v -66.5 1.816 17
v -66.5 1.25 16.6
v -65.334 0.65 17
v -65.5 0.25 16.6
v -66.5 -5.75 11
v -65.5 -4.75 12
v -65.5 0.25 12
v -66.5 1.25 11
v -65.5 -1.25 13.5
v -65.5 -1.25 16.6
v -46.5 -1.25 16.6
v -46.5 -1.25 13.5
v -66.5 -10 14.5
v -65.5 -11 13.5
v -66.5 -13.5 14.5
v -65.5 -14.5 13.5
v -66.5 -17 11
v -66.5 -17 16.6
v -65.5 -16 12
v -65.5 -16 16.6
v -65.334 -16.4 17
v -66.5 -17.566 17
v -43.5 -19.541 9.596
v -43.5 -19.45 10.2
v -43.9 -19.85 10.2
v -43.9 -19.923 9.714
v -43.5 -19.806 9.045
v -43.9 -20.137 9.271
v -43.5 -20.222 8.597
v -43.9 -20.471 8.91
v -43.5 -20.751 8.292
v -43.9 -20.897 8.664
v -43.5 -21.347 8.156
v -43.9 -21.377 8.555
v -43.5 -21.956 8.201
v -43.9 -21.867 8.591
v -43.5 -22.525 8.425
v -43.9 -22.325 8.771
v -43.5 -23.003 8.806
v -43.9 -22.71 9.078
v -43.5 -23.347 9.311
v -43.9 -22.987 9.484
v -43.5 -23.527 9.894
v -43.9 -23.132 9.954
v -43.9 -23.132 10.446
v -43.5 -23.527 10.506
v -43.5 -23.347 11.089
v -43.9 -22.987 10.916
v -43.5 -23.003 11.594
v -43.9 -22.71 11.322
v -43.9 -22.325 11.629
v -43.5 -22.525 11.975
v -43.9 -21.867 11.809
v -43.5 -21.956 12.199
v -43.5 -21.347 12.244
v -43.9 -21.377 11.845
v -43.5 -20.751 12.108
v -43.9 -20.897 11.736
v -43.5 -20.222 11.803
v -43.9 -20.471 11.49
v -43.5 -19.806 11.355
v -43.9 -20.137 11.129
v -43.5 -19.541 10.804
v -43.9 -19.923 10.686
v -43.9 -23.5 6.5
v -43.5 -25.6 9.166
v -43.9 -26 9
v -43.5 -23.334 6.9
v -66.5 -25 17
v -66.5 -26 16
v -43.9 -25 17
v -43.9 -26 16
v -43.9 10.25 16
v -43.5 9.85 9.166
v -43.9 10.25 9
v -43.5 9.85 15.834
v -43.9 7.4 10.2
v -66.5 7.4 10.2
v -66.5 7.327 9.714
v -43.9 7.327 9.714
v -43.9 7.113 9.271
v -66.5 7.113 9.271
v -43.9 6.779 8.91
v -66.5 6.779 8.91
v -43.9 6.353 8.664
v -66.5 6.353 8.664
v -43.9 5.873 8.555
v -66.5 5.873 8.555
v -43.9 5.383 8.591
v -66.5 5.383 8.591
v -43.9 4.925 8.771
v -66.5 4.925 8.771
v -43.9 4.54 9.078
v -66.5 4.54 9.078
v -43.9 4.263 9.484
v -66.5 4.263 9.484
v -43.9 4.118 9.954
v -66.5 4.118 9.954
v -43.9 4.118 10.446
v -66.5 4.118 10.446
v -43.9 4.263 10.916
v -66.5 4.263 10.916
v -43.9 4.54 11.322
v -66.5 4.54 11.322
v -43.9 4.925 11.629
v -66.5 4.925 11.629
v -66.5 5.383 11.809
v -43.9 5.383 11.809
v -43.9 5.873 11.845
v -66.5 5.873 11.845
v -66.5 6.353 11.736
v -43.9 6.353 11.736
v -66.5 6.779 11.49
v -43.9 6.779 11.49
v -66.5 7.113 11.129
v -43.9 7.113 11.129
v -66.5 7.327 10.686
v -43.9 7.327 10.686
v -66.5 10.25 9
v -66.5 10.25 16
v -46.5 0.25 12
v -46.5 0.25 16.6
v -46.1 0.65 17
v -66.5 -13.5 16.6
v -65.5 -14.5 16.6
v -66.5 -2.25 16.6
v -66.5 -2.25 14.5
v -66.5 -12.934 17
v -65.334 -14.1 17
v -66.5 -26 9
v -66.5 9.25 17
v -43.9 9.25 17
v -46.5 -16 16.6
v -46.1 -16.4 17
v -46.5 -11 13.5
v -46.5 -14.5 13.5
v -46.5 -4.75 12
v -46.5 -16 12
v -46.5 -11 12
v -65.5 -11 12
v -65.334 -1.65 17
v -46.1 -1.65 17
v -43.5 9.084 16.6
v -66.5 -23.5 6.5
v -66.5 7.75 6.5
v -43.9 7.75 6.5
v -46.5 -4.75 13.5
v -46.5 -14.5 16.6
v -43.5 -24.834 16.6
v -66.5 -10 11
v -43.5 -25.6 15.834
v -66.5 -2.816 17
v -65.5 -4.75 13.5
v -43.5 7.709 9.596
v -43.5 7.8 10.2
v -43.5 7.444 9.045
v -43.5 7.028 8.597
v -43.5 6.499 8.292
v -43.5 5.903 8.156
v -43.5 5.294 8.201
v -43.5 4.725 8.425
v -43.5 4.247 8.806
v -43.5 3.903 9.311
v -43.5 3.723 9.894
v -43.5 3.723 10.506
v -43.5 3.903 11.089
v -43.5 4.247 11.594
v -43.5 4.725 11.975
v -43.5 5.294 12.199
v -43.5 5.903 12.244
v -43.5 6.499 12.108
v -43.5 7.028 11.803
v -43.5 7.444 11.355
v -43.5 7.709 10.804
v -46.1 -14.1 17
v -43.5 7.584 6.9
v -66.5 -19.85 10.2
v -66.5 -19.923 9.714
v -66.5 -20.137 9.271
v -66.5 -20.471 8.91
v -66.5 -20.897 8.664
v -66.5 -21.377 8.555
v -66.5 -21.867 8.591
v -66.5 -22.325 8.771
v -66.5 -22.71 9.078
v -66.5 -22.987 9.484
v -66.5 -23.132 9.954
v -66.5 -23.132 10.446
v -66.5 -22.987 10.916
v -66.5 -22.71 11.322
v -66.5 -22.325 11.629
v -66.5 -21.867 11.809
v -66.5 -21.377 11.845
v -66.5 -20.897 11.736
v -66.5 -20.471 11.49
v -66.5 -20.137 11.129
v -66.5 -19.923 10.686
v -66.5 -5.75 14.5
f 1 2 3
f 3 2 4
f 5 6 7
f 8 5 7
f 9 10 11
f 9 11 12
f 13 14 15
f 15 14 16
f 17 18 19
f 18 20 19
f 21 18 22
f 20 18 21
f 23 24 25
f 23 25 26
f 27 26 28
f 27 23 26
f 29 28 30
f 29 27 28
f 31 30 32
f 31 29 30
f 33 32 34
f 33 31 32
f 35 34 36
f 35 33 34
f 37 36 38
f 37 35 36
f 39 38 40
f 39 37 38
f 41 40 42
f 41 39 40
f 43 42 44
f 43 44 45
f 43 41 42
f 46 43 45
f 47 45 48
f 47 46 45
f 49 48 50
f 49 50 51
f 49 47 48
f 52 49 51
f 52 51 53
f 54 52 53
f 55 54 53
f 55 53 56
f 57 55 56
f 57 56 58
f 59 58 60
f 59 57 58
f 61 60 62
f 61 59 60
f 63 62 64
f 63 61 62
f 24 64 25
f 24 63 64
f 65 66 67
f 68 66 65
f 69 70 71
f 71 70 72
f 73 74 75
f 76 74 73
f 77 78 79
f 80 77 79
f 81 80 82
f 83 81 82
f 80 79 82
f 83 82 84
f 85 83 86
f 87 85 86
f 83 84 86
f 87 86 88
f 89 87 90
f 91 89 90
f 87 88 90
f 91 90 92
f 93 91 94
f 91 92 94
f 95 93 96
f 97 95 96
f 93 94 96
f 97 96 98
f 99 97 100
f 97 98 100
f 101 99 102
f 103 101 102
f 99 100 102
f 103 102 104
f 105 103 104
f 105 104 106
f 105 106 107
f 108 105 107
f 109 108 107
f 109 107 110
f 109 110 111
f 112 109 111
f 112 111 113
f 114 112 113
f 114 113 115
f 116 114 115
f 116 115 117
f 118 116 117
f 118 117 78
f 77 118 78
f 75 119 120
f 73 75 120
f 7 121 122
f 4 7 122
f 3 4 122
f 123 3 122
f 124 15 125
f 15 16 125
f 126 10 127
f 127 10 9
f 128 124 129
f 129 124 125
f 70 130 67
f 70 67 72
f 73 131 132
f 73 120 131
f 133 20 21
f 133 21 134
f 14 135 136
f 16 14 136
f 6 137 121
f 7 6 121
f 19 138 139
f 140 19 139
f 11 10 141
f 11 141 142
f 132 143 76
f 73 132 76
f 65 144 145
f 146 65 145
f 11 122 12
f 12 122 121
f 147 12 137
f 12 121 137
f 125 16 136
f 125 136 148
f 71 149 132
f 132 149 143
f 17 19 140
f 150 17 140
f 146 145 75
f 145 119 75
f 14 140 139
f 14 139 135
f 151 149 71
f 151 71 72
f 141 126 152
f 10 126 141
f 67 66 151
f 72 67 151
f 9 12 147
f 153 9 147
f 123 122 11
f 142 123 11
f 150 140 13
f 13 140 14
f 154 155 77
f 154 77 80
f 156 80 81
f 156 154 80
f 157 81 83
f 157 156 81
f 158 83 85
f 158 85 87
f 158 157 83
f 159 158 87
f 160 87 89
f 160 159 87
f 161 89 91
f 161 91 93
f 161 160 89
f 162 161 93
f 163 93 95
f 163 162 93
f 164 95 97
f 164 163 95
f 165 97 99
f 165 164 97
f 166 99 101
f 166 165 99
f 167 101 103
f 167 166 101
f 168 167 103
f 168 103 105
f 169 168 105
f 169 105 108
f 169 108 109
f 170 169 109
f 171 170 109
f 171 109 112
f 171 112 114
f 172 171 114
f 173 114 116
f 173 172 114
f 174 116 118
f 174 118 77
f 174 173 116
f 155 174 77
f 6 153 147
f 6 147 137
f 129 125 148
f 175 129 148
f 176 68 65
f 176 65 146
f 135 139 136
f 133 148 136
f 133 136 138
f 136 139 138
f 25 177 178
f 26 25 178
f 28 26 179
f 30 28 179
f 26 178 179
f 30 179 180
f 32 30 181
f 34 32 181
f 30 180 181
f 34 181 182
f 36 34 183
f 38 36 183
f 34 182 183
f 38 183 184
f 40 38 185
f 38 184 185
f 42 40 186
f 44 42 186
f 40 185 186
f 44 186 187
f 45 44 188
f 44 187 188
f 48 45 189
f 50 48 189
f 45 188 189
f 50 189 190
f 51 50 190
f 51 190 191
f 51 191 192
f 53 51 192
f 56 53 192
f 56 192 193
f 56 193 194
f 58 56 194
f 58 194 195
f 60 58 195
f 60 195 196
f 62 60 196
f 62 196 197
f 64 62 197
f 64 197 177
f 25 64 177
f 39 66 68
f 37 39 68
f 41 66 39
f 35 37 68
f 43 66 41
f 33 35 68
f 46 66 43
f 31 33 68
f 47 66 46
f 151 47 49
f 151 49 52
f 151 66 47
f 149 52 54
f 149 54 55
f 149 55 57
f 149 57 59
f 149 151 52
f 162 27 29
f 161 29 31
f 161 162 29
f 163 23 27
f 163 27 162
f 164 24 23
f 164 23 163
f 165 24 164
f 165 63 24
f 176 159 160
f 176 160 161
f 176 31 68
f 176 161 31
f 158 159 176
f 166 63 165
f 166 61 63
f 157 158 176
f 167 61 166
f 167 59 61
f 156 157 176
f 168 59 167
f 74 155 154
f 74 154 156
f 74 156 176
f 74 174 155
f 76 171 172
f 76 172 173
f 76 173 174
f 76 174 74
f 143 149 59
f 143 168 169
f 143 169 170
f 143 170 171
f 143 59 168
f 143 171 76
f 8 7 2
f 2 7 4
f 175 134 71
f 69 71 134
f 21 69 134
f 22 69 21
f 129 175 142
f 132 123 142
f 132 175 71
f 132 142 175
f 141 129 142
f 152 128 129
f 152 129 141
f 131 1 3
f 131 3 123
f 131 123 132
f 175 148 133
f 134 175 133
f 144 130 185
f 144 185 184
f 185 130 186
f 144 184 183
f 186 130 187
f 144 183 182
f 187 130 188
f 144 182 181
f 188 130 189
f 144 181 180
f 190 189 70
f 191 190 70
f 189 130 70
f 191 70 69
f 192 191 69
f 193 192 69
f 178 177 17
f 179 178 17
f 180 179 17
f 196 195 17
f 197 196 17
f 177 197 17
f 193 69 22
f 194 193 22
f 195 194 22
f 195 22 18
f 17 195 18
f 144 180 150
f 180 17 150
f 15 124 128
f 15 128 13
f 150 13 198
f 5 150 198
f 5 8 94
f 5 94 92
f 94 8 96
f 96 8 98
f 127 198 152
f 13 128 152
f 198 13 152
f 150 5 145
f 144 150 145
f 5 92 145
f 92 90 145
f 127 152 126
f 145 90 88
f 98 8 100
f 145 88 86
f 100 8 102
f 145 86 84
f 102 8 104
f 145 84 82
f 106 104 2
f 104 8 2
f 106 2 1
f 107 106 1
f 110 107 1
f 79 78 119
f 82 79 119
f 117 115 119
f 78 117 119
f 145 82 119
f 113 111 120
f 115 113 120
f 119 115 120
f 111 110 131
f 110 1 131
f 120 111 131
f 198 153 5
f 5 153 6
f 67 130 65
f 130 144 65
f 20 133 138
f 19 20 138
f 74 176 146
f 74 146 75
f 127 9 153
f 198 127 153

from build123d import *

# Parameters (mm, degrees)
SKETCH038_W     = 36.25
SKETCH038_H     = 10.5
PAD012_DEPTH    = 23
SKETCH039_R     = 1.65
POCKET026_DEPTH = 23.001
POCKET027_DEPTH = 20
CHAMFER014_SIZE = 1
CHAMFER015_SIZE = 1
CHAMFER016_SIZE = 2.5
CHAMFER017_SIZE = 0.4
CHAMFER018_SIZE = 0.4


with BuildPart() as part:
    # Sketch038 → Pad012 (new body)
    with BuildSketch(Plane.YZ):
        with Locations((18.125, 5.25)):
            Rectangle(SKETCH038_W, SKETCH038_H)
    extrude(amount=PAD012_DEPTH)

    # Sketch039 (on Face5 of Pad012) → Pocket026 (cut, through all)
    with BuildSketch(Plane(origin=(0, 0, 0), x_dir=(0, 1, 0), z_dir=(-1, 0, 0))):
        with Locations((4.5, -3.7)):
            Circle(SKETCH039_R)
        with Locations((31.75, -3.7)):
            Circle(SKETCH039_R)
    extrude(amount=-POCKET026_DEPTH, mode=Mode.SUBTRACT)

    # Sketch040 (on Face4 of Pocket026) → Pocket027 (cut)
    with BuildSketch(Plane(origin=(0, 0, 0), x_dir=(0, 1, 0), z_dir=(-1, 0, 0))):
        Polygon((10, -10.5), (10, -5.5), (15, -5.5), (15, -7), (11.5, -7), (11.5, -10.5), align=None)
        Polygon((24.75, -10.5), (24.75, -7), (21.25, -7), (21.25, -5.5), (26.25, -5.5), (26.25, -10.5), align=None)
    extrude(amount=-POCKET027_DEPTH, mode=Mode.SUBTRACT)

    # Chamfer014
    chamfer014_edges = [part.edges().sort_by_distance(p)[0] for p in [
        (0, 26.25, 8),
        (0, 23.75, 5.5),
        (0, 21.25, 6.25),
        (0, 23, 7),
        (0, 24.75, 8.75),
        (0, 15, 6.25),
        (0, 13.25, 7),
        (0, 12.5, 5.5),
        (0, 10, 8),
        (0, 11.5, 8.75),
    ]]
    chamfer(chamfer014_edges, length=CHAMFER014_SIZE)

    # Chamfer015
    chamfer015_edges = [part.edges().sort_by_distance(p)[0] for p in [
        (11.5, 36.25, 10.5),
        (11.5, 0, 10.5),
    ]]
    chamfer(chamfer015_edges, length=CHAMFER015_SIZE)

    # Chamfer016
    chamfer016_edges = [part.edges().sort_by_distance(p)[0] for p in [
        (11.5, 36.25, 0),
        (11.5, 0, 0),
    ]]
    chamfer(chamfer016_edges, length=CHAMFER016_SIZE)

    # Chamfer017
    chamfer017_edges = [part.edges().sort_by_distance(p)[0] for p in [
        (10.5, 26.25, 10.5),
        (0.5, 26.75, 10.5),
        (0.5, 24.25, 10.5),
        (10.5, 24.75, 10.5),
        (20, 25.5, 10.5),
        (20, 10.75, 10.5),
        (10.5, 11.5, 10.5),
        (0.5, 12, 10.5),
        (0.5, 9.5, 10.5),
        (10.5, 10, 10.5),
    ]]
    chamfer(chamfer017_edges, length=CHAMFER017_SIZE)

    # Chamfer018
    chamfer018_edges = [part.edges().sort_by_distance(p)[0] for p in [
        (23, 0, 6),
        (23, 1.25, 1.25),
        (23, 0.5, 10),
        (23, 18.125, 0),
        (23, 18.125, 10.5),
        (23, 35, 1.25),
        (23, 35.75, 10),
        (23, 36.25, 6),
        (23, 30.1, 3.7),
        (23, 2.85, 3.7),
    ]]
    chamfer(chamfer018_edges, length=CHAMFER018_SIZE)


with BuildPart() as part_1:
    # Body004006 placement: moved
    add(part.part.moved(Location((-66.5, -26, 6.5))))


solid = part_1.part
